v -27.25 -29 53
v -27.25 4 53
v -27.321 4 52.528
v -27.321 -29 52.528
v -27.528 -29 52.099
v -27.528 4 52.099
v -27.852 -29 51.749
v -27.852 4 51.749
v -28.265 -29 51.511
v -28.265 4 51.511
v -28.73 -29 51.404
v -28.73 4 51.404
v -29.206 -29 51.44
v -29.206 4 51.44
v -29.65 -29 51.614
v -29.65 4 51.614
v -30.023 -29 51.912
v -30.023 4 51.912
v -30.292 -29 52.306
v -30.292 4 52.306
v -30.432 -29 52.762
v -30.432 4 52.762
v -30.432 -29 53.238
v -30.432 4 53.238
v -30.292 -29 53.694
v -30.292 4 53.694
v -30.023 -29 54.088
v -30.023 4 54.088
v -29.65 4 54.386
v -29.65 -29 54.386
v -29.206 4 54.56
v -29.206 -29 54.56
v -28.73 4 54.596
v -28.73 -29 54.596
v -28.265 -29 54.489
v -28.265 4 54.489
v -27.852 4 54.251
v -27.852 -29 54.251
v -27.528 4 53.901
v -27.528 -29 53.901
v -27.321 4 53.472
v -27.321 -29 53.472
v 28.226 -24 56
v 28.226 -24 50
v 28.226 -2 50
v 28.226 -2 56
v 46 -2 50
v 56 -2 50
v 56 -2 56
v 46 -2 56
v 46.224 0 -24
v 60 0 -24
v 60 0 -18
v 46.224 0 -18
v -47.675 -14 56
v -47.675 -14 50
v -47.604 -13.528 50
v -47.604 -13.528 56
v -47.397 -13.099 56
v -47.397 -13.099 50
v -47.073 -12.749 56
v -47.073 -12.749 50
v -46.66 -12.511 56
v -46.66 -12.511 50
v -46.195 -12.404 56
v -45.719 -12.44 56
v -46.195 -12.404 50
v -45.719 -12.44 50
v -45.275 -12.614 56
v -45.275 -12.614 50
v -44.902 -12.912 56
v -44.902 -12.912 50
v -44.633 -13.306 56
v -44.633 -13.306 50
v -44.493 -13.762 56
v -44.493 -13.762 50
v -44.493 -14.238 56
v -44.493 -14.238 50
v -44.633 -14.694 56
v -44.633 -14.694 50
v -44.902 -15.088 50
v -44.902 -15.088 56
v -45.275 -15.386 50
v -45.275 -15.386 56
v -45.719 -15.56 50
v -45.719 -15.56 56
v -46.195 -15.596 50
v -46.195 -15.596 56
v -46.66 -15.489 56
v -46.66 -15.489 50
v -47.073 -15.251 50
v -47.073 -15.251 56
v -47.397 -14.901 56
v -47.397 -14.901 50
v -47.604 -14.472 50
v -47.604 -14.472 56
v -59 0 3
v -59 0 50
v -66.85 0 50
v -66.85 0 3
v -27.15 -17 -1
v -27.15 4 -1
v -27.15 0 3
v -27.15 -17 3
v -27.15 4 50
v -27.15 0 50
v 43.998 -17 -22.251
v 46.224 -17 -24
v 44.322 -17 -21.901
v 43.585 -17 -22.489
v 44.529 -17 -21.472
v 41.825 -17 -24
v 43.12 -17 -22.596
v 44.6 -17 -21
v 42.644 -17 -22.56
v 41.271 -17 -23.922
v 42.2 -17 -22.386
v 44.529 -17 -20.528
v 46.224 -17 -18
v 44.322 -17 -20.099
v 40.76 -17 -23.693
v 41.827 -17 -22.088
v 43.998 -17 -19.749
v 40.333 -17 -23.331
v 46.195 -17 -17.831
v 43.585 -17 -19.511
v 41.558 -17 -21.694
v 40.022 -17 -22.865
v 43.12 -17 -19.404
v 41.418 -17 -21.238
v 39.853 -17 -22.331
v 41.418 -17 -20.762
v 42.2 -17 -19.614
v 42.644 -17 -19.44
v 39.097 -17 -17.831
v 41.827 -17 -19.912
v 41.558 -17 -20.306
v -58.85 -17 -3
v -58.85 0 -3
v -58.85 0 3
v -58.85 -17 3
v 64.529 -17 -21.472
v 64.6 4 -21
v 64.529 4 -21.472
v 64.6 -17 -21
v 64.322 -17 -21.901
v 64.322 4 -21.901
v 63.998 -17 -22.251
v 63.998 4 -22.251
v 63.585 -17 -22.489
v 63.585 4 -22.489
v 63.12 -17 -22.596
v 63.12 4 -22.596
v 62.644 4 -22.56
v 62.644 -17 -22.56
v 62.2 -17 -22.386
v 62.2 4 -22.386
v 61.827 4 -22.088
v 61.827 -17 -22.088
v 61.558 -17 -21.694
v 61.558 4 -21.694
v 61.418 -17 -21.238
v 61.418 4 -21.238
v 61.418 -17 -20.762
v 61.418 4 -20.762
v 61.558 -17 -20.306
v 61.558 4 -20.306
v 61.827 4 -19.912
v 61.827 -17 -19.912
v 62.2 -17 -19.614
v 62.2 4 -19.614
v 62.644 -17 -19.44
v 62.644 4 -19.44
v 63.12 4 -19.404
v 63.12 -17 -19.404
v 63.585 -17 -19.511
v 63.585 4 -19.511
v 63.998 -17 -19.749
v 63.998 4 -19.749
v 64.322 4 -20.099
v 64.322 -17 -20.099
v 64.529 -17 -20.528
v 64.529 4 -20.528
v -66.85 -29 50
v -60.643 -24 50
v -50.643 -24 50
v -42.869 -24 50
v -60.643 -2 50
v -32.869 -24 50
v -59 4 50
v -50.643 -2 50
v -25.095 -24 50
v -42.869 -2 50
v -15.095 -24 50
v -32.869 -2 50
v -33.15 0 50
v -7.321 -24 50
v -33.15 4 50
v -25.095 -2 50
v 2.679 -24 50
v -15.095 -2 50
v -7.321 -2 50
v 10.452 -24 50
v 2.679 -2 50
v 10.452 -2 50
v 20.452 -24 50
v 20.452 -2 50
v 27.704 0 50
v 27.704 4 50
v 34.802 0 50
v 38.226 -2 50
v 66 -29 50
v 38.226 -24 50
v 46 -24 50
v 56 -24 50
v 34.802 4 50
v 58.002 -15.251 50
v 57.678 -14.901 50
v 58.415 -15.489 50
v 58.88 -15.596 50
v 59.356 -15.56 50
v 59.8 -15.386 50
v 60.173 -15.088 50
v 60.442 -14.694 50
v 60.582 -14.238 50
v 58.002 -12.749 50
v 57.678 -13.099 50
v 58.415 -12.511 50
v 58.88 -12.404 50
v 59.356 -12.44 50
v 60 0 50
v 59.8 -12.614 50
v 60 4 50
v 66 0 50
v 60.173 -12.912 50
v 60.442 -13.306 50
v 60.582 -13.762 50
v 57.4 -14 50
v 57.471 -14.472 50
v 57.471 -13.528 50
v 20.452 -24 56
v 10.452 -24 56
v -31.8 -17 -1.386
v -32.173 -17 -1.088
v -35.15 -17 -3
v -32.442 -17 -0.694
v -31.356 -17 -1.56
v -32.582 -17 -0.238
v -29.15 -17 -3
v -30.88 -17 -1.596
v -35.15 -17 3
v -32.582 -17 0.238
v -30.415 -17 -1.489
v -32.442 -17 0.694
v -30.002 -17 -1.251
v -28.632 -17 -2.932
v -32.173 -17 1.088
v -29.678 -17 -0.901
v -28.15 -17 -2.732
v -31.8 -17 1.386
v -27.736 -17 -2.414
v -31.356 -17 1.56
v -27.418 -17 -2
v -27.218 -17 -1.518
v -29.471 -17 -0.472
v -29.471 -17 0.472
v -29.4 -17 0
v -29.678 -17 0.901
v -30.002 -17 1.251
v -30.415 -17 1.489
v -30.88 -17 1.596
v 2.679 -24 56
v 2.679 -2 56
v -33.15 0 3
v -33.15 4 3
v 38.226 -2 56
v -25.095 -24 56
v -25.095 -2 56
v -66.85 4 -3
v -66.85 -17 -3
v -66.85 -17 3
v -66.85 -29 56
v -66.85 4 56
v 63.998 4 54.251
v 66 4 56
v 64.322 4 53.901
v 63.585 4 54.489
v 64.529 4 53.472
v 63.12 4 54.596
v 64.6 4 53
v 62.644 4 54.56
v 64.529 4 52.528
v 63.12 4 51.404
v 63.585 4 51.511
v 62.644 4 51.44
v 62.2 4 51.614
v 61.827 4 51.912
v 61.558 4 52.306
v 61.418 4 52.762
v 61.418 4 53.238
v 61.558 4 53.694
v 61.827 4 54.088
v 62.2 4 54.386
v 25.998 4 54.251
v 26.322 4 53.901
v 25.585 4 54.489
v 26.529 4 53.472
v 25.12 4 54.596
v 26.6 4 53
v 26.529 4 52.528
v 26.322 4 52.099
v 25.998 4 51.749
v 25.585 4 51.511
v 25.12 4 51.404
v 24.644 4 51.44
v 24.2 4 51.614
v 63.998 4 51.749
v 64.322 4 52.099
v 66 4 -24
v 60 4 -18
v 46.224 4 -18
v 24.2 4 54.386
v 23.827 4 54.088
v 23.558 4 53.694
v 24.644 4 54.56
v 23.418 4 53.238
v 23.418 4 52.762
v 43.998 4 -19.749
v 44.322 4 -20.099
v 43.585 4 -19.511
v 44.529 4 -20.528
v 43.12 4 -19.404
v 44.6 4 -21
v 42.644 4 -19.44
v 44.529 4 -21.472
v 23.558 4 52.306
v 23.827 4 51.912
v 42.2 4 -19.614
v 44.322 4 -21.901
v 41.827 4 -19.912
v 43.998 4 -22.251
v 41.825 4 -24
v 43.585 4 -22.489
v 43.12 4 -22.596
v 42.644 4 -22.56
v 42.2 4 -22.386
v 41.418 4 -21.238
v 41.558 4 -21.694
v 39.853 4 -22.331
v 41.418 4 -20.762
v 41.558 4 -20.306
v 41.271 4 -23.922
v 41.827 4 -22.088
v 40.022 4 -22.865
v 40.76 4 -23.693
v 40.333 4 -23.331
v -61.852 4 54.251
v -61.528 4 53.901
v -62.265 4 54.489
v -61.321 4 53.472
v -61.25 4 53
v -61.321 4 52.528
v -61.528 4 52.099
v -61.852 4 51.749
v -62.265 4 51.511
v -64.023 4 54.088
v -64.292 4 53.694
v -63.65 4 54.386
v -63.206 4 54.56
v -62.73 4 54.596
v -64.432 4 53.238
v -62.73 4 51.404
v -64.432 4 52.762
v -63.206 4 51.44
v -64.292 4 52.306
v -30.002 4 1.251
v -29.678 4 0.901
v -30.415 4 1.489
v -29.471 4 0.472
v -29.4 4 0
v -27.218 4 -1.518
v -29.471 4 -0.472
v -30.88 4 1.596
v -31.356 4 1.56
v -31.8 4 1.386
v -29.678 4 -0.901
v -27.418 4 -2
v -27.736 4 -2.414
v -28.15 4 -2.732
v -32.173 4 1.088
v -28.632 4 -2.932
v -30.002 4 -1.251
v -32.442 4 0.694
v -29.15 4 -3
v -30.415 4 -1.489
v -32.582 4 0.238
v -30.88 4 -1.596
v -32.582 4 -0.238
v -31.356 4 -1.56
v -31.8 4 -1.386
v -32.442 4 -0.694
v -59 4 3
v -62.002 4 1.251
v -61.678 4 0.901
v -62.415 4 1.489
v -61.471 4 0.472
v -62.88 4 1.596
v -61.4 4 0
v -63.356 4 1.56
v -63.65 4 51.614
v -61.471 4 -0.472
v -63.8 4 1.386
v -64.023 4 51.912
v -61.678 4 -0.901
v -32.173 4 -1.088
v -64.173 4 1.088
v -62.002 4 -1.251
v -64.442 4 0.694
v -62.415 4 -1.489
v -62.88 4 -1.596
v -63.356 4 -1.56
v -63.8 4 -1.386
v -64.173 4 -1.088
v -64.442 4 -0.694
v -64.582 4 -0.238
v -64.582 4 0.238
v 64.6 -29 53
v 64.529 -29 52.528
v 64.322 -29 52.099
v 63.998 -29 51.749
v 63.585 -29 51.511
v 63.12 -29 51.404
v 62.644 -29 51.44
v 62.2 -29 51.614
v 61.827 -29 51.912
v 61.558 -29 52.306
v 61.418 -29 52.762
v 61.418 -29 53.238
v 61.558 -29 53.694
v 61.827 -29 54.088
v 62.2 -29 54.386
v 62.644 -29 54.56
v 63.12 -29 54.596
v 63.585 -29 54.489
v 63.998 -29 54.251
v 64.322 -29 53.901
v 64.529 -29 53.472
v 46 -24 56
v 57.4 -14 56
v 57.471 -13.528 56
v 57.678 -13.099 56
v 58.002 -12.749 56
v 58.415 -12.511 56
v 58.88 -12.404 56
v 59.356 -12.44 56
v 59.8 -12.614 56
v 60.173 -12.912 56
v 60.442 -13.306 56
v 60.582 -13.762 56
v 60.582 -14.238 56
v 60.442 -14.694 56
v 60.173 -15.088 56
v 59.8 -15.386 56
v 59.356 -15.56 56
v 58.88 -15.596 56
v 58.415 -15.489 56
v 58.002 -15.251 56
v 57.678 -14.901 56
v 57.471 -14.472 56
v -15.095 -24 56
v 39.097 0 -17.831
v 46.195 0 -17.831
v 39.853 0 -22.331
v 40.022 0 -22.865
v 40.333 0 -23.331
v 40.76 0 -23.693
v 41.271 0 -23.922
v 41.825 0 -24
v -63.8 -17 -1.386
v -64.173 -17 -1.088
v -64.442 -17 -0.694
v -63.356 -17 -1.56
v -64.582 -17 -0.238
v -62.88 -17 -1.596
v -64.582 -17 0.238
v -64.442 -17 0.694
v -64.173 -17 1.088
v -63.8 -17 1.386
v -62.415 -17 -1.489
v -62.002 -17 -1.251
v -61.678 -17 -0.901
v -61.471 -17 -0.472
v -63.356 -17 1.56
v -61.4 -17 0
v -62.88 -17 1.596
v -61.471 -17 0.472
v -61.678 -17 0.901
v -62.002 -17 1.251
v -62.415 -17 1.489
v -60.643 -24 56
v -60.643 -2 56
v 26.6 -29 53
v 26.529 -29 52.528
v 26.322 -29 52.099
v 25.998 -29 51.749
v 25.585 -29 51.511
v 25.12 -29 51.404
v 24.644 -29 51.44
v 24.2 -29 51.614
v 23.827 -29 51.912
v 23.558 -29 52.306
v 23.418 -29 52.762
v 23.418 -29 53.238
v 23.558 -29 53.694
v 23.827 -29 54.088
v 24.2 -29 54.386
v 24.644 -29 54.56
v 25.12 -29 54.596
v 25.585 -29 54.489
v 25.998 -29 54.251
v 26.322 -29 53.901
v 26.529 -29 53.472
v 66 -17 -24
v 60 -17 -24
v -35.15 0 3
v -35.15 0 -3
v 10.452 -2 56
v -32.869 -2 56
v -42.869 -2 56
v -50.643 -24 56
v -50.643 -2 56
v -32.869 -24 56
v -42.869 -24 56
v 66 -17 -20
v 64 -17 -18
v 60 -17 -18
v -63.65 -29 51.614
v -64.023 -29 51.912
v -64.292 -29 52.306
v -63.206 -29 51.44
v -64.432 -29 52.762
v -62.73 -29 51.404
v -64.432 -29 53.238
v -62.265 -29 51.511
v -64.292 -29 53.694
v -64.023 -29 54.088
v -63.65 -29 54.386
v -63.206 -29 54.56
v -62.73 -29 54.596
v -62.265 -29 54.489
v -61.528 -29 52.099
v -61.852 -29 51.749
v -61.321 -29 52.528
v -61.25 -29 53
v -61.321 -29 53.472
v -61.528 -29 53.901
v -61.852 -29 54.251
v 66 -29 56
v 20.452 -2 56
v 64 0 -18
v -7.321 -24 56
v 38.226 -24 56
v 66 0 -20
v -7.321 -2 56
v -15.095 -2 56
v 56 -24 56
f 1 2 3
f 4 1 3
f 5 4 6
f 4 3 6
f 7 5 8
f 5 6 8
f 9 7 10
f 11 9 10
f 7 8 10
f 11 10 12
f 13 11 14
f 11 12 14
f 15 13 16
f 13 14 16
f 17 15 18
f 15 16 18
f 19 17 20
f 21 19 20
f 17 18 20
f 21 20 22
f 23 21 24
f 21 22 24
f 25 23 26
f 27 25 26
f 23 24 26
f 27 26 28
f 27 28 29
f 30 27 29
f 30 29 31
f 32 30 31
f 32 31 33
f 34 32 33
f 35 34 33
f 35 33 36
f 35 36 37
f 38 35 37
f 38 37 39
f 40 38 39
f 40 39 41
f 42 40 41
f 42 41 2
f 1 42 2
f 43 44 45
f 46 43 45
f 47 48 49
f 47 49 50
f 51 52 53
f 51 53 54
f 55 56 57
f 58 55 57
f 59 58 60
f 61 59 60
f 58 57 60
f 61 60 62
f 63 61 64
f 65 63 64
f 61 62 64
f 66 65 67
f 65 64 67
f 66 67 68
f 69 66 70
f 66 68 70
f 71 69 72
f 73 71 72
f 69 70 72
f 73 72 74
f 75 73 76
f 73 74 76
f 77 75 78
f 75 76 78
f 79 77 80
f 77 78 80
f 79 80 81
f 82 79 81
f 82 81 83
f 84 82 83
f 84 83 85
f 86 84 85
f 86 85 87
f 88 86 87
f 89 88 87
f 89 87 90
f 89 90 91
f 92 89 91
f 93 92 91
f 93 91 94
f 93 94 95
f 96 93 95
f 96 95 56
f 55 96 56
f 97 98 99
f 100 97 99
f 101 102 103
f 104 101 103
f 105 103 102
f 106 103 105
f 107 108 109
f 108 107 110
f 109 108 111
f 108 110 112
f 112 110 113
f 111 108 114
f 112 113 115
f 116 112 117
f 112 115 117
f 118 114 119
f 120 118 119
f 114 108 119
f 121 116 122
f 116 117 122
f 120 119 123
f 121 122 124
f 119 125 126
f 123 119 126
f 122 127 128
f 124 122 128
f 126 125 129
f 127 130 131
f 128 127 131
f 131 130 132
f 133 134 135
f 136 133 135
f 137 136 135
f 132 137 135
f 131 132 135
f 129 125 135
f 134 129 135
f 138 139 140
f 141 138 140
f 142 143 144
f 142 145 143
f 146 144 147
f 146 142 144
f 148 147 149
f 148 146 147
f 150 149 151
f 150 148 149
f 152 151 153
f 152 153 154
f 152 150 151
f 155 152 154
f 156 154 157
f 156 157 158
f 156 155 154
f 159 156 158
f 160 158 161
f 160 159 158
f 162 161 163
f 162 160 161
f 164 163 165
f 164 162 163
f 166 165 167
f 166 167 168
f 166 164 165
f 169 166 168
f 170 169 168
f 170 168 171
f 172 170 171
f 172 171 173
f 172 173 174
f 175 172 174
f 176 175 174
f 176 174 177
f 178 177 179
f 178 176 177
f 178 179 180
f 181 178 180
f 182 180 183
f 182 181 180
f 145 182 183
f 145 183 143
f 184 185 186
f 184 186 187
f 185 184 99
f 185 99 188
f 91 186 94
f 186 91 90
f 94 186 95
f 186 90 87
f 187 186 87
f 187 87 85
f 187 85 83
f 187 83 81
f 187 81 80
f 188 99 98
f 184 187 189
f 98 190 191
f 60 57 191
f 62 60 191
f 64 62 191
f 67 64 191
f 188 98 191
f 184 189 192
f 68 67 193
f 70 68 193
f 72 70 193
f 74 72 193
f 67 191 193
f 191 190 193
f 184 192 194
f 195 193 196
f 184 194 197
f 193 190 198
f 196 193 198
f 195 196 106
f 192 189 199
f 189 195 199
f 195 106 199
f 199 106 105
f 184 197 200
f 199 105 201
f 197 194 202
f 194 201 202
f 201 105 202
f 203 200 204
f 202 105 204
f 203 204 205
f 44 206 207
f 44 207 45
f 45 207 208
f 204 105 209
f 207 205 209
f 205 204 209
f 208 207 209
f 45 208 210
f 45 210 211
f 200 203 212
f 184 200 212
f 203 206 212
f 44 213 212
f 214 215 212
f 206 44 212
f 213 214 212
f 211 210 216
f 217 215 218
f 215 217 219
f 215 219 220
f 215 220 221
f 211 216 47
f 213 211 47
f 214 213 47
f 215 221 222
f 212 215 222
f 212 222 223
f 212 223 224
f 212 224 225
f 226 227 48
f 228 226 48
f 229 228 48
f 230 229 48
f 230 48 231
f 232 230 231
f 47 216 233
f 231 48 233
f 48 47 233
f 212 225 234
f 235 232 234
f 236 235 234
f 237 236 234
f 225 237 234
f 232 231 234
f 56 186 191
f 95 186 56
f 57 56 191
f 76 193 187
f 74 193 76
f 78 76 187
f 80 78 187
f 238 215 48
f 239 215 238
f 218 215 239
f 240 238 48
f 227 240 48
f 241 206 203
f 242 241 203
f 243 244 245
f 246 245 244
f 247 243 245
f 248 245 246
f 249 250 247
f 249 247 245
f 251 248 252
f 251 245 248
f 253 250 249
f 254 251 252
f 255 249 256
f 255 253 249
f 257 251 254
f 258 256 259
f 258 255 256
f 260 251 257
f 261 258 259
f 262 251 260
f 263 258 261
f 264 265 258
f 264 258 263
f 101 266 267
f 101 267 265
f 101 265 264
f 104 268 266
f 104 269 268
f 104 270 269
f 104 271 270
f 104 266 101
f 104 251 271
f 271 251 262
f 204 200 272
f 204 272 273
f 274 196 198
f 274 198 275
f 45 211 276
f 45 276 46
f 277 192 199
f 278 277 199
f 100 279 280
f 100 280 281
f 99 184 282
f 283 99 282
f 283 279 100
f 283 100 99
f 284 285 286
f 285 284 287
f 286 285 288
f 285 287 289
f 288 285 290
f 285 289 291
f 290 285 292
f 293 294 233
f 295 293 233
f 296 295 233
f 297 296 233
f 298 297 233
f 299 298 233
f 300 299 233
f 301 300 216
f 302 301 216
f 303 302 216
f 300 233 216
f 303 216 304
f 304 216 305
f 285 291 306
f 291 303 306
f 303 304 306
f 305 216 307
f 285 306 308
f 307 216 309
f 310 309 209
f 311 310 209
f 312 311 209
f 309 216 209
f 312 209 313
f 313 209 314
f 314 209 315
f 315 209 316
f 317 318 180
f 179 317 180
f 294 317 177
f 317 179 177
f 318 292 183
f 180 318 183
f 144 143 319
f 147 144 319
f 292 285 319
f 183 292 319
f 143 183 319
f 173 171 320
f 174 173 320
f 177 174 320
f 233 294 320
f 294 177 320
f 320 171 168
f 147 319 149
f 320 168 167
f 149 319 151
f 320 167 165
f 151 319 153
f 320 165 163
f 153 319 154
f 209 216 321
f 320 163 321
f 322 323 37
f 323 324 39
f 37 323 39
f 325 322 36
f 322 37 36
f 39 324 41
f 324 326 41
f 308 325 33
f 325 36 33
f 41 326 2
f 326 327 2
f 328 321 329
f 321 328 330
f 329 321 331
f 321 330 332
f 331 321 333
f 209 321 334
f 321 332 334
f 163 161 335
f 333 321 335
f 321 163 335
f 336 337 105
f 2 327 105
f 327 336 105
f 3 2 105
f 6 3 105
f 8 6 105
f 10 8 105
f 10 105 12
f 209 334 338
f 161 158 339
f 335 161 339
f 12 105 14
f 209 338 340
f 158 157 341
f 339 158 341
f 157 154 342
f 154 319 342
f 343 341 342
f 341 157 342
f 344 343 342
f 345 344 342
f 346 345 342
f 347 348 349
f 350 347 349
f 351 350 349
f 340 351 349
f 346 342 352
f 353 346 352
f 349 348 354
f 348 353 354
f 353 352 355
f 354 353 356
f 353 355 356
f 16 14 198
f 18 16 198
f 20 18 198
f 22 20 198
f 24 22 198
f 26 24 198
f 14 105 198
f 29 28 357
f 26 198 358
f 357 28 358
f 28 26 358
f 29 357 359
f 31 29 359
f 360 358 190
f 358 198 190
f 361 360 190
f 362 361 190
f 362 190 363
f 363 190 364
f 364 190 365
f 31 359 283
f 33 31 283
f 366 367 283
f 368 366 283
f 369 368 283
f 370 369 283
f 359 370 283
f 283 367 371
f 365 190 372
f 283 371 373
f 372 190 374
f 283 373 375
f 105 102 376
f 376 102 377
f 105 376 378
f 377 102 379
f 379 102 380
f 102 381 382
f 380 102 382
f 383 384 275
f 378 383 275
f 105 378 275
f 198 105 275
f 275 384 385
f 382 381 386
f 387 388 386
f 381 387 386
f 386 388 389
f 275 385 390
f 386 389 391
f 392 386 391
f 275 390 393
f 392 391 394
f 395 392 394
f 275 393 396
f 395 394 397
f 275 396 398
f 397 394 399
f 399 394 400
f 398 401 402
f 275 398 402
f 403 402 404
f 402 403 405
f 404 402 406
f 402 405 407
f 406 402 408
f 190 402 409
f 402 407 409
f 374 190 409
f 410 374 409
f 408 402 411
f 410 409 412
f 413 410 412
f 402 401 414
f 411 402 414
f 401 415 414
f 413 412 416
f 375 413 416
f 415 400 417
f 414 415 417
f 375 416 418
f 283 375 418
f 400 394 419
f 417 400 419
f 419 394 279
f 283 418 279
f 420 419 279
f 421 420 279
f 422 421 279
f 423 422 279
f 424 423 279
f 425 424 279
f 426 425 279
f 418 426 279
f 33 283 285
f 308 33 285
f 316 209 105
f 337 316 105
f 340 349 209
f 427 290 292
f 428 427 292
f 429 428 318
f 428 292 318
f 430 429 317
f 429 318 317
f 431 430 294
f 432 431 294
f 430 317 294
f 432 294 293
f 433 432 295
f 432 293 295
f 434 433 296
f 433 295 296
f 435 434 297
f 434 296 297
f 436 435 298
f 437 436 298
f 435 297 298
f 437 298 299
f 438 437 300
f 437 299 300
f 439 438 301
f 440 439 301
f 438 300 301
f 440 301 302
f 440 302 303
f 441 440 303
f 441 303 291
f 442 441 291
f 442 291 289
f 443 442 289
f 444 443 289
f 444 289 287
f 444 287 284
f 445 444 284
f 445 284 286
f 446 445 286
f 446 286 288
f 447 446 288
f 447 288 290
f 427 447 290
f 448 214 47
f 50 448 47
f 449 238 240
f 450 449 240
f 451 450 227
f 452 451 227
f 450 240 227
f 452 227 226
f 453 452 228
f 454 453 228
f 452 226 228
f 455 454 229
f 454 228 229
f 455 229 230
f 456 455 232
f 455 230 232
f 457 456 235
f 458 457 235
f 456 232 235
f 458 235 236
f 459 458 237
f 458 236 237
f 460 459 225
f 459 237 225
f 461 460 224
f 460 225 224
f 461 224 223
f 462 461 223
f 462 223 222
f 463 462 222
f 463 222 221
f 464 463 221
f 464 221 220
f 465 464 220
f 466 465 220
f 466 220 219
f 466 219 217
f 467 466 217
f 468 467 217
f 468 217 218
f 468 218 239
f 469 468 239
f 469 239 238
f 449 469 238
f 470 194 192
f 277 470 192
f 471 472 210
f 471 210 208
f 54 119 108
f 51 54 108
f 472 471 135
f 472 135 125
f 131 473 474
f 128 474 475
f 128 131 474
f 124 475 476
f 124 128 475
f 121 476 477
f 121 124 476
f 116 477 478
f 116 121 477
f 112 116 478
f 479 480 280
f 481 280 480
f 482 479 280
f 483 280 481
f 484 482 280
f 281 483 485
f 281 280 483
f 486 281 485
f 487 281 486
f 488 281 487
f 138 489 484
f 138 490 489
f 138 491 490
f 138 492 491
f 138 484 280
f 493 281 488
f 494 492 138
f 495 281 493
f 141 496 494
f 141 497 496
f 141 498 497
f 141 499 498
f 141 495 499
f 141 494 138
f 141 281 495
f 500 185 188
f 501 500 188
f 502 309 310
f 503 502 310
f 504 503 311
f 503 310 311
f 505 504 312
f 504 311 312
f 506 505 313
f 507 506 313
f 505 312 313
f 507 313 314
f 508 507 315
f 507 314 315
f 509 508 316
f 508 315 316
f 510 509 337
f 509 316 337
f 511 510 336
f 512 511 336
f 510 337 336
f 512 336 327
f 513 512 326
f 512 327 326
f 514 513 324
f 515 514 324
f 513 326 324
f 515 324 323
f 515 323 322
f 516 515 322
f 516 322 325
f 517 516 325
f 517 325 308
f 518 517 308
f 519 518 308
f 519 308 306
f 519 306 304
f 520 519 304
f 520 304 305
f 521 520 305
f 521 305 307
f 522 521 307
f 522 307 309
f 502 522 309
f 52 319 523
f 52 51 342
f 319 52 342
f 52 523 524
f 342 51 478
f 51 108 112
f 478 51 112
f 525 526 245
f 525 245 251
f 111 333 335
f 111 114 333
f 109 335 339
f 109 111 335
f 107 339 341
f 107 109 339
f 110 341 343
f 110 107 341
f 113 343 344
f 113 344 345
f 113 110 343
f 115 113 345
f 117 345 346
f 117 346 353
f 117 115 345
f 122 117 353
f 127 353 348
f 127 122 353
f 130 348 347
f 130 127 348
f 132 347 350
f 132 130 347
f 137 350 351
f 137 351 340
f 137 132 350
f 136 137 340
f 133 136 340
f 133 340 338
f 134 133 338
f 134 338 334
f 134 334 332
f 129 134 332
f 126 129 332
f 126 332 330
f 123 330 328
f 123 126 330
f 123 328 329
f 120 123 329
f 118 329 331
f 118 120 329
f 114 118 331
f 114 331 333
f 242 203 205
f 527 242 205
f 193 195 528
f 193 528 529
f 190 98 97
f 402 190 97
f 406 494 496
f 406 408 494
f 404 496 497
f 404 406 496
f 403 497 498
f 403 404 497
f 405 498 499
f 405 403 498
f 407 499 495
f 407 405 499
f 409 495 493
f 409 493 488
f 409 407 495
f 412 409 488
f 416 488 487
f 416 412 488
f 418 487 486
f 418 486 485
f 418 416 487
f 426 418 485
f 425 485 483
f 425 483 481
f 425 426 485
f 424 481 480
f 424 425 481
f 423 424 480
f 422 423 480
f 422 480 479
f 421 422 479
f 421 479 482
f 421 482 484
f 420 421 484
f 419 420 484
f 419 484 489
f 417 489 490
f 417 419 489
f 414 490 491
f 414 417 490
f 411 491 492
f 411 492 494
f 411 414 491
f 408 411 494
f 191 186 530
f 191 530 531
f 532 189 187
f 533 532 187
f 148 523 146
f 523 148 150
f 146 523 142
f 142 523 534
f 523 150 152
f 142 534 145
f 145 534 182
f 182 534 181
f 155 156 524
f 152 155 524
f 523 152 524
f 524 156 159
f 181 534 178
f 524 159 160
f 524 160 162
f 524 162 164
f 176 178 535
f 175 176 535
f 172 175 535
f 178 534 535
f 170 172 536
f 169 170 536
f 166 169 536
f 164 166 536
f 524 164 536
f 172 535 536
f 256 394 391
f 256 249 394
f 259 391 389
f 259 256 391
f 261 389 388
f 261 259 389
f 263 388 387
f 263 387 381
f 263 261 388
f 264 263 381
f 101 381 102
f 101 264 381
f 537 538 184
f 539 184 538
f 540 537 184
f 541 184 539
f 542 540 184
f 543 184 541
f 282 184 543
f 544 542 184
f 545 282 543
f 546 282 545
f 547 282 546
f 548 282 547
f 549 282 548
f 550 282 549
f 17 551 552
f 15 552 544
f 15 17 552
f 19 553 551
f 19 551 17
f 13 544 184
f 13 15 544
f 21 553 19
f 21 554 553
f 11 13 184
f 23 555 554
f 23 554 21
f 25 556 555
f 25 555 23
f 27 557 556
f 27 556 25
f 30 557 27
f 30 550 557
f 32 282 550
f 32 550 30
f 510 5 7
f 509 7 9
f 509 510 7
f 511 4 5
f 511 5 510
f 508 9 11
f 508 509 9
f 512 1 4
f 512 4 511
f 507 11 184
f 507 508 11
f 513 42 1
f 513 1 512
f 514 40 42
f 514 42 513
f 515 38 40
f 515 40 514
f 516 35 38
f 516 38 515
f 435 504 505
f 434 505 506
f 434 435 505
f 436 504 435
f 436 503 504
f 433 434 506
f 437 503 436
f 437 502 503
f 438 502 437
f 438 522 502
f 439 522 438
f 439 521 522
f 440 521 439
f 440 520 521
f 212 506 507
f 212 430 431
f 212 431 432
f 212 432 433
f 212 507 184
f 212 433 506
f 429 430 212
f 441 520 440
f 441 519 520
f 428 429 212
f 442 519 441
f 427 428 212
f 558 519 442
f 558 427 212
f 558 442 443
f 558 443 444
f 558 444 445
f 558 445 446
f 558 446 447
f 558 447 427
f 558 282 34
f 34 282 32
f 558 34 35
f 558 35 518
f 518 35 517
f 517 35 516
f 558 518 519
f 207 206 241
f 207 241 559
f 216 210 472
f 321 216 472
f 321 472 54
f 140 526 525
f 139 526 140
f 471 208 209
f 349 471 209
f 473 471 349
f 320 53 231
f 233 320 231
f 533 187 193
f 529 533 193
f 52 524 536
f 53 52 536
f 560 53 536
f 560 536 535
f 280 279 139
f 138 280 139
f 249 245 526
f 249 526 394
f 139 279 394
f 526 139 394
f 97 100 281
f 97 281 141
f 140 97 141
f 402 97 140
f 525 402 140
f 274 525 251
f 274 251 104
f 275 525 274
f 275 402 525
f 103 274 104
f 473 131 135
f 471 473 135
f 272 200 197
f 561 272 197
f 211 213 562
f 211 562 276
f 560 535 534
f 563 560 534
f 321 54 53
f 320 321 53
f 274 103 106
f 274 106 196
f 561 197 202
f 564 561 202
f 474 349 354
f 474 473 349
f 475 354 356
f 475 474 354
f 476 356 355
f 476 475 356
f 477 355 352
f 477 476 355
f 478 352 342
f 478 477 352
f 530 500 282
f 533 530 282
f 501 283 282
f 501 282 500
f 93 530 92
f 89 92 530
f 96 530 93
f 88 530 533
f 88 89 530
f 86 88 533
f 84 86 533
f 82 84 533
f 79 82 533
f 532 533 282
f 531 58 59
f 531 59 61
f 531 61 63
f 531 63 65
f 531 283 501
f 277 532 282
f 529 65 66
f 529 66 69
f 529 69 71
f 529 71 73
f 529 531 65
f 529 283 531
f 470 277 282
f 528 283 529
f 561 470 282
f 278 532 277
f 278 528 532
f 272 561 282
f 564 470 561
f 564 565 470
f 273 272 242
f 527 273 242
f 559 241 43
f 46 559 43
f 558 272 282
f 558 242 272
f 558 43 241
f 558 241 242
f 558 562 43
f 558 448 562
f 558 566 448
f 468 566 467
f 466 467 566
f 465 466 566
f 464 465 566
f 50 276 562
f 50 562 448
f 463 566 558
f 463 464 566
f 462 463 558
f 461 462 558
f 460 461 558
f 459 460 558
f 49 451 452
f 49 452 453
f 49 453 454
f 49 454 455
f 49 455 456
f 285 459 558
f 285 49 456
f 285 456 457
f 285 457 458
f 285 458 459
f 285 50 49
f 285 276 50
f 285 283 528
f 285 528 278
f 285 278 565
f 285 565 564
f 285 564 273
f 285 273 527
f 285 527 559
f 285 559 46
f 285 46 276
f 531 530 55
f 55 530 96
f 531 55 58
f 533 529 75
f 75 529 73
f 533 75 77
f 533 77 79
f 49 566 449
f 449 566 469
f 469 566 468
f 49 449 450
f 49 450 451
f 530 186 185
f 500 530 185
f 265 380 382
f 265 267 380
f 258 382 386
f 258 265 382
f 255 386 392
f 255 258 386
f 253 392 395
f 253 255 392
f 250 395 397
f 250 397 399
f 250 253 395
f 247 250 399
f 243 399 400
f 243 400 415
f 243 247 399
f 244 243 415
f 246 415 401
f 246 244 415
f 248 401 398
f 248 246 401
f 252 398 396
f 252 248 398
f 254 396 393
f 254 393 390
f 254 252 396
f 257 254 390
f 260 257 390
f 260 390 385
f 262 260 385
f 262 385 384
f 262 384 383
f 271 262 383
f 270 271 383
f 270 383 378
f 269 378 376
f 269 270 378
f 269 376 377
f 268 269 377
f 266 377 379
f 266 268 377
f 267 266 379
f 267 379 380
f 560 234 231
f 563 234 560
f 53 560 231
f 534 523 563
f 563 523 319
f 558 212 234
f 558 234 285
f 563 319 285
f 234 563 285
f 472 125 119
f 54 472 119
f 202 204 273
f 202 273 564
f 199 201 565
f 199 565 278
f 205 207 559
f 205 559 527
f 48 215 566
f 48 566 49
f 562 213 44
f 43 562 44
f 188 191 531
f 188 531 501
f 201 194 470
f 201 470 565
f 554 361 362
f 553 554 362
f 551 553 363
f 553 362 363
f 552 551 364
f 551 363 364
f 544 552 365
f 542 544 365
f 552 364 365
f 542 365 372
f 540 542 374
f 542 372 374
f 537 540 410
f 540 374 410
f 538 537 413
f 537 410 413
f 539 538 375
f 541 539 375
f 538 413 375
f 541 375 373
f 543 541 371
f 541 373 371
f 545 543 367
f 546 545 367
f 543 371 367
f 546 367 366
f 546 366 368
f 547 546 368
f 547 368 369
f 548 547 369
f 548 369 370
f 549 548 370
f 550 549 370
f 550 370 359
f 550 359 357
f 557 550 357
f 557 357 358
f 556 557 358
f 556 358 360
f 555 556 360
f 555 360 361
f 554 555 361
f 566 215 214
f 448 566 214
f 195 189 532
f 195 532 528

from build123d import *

# Parameters (mm, degrees)
SKETCH_1_R          = 1.6
SKETCH_1_W          = 25.85
SKETCH_1_H          = 47
EXTRUDE_1_DEPTH     = 4
SKETCH_2_W          = 8
SKETCH_2_H          = 6
SKETCH_2_R          = 1.6
EXTRUDE_2_DEPTH     = 17
FILLET_1_R          = 2
SKETCH_3_W          = 132.85
SKETCH_3_H          = 6
EXTRUDE_3_DEPTH     = 29
SKETCH_4_W          = 10
SKETCH_4_H          = 22
CUT_EXTRUDE_1_DEPTH = 7
SKETCH_5_R          = 1.6
CUT_EXTRUDE_2_DEPTH = 34
SKETCH_6_R          = 1.6
CUT_EXTRUDE_3_DEPTH = 7


with BuildPart() as part:
    # Эскиз1 → Бобышка-Вытянуть1 (new body)
    with BuildSketch(Plane(origin=(0, 0, 0), x_dir=(1, 0, 0), z_dir=(0, 1, 0))):
        Polygon((66, 24), (66, -56), (-66.85, -56), (-66.85, 3), (-59.15, 3), (-34.85, 3), (-27.15, 3), (-27.15, -50), (27.704212942, -50), (40.133263836, 24), (60, 24), align=None)
        with Locations((63, 21)):
            Circle(SKETCH_1_R, mode=Mode.SUBTRACT)
        with Locations((-63, 0)):
            Circle(SKETCH_1_R, mode=Mode.SUBTRACT)
        with Locations((-31, 0)):
            Circle(SKETCH_1_R, mode=Mode.SUBTRACT)
        with Locations((43, 21)):
            Circle(SKETCH_1_R, mode=Mode.SUBTRACT)
        with Locations((-46.075, -26.5)):
            Rectangle(SKETCH_1_W, SKETCH_1_H, mode=Mode.SUBTRACT)
        Polygon((60, 18), (60, -50), (34.802263374, -50), (46.223553385, 18), align=None, mode=Mode.SUBTRACT)
    extrude(amount=EXTRUDE_1_DEPTH)

    # Эскиз2 → Бобышка-Вытянуть2 (add)
    with BuildSketch(Plane.XZ):
        with Locations((-62.85, 0)):
            Rectangle(SKETCH_2_W, SKETCH_2_H)
        with Locations((-63, 0)):
            Circle(SKETCH_2_R, mode=Mode.SUBTRACT)
        Polygon((66, -20), (66, -24), (60, -24), (60, -18), (64, -18), align=None)
        with Locations((63, -21)):
            Circle(SKETCH_2_R, mode=Mode.SUBTRACT)
        with Locations((-31.15, 0)):
            Rectangle(SKETCH_2_W, SKETCH_2_H)
        with Locations((-31, 0)):
            Circle(SKETCH_2_R, mode=Mode.SUBTRACT)
        Polygon((46.223553385, -18), (46.223553385, -24), (40.133263836, -24), (39.097062378, -17.830670696), (46.195112811, -17.830670696), align=None)
        with Locations((43, -21)):
            Circle(SKETCH_2_R, mode=Mode.SUBTRACT)
    extrude(amount=EXTRUDE_2_DEPTH)

    # Скругление1
    fillet_1_edges = [part.edges().sort_by_distance(p)[0] for p in [
        (-27.15, -6.5, -3),
        (40.133263836, -6.5, -24),
    ]]
    fillet(fillet_1_edges, radius=FILLET_1_R)

    # Эскиз3 → Бобышка-Вытянуть3 (add)
    with BuildSketch(Plane.XZ):
        with Locations((-0.425, 53)):
            Rectangle(SKETCH_3_W, SKETCH_3_H)
    extrude(amount=EXTRUDE_3_DEPTH)

    # Эскиз4 → Вырез-Вытянуть1 (cut, through all)
    with BuildSketch(Plane(origin=(0, 0, 50), x_dir=(-1, 0, 0), z_dir=(0, 0, -1))):
        with Locations((20.095331259, -13)):
            Rectangle(SKETCH_4_W, SKETCH_4_H)
        with Locations((2.321498445, -13)):
            Rectangle(SKETCH_4_W, SKETCH_4_H)
        with Locations((-15.45233437, -13)):
            Rectangle(SKETCH_4_W, SKETCH_4_H)
        with Locations((-33.226167185, -13)):
            Rectangle(SKETCH_4_W, SKETCH_4_H)
        with Locations((-51, -13)):
            Rectangle(SKETCH_4_W, SKETCH_4_H)
        with Locations((37.869164074, -13)):
            Rectangle(SKETCH_4_W, SKETCH_4_H)
        with Locations((55.642996889, -13)):
            Rectangle(SKETCH_4_W, SKETCH_4_H)
    extrude(amount=-CUT_EXTRUDE_1_DEPTH, mode=Mode.SUBTRACT)

    # Эскиз5 → Вырез-Вытянуть2 (cut, through all)
    with BuildSketch(Plane(origin=(0, 4, 0), x_dir=(1, 0, 0), z_dir=(0, 1, 0))):
        with Locations((-62.85, -53)):
            Circle(SKETCH_5_R)
        with Locations((-28.85, -53)):
            Circle(SKETCH_5_R)
        with Locations((63, -53)):
            Circle(SKETCH_5_R)
        with Locations((25, -53)):
            Circle(SKETCH_5_R)
    extrude(amount=-CUT_EXTRUDE_2_DEPTH, mode=Mode.SUBTRACT)

    # Эскиз6 → Вырез-Вытянуть3 (cut, through all)
    with BuildSketch(Plane(origin=(0, 0, 50), x_dir=(-1, 0, 0), z_dir=(0, 0, -1))):
        with Locations((46.075, -14)):
            Circle(SKETCH_6_R)
        with Locations((-59, -14)):
            Circle(SKETCH_6_R)
    extrude(amount=-CUT_EXTRUDE_3_DEPTH, mode=Mode.SUBTRACT)


solid = part.part
